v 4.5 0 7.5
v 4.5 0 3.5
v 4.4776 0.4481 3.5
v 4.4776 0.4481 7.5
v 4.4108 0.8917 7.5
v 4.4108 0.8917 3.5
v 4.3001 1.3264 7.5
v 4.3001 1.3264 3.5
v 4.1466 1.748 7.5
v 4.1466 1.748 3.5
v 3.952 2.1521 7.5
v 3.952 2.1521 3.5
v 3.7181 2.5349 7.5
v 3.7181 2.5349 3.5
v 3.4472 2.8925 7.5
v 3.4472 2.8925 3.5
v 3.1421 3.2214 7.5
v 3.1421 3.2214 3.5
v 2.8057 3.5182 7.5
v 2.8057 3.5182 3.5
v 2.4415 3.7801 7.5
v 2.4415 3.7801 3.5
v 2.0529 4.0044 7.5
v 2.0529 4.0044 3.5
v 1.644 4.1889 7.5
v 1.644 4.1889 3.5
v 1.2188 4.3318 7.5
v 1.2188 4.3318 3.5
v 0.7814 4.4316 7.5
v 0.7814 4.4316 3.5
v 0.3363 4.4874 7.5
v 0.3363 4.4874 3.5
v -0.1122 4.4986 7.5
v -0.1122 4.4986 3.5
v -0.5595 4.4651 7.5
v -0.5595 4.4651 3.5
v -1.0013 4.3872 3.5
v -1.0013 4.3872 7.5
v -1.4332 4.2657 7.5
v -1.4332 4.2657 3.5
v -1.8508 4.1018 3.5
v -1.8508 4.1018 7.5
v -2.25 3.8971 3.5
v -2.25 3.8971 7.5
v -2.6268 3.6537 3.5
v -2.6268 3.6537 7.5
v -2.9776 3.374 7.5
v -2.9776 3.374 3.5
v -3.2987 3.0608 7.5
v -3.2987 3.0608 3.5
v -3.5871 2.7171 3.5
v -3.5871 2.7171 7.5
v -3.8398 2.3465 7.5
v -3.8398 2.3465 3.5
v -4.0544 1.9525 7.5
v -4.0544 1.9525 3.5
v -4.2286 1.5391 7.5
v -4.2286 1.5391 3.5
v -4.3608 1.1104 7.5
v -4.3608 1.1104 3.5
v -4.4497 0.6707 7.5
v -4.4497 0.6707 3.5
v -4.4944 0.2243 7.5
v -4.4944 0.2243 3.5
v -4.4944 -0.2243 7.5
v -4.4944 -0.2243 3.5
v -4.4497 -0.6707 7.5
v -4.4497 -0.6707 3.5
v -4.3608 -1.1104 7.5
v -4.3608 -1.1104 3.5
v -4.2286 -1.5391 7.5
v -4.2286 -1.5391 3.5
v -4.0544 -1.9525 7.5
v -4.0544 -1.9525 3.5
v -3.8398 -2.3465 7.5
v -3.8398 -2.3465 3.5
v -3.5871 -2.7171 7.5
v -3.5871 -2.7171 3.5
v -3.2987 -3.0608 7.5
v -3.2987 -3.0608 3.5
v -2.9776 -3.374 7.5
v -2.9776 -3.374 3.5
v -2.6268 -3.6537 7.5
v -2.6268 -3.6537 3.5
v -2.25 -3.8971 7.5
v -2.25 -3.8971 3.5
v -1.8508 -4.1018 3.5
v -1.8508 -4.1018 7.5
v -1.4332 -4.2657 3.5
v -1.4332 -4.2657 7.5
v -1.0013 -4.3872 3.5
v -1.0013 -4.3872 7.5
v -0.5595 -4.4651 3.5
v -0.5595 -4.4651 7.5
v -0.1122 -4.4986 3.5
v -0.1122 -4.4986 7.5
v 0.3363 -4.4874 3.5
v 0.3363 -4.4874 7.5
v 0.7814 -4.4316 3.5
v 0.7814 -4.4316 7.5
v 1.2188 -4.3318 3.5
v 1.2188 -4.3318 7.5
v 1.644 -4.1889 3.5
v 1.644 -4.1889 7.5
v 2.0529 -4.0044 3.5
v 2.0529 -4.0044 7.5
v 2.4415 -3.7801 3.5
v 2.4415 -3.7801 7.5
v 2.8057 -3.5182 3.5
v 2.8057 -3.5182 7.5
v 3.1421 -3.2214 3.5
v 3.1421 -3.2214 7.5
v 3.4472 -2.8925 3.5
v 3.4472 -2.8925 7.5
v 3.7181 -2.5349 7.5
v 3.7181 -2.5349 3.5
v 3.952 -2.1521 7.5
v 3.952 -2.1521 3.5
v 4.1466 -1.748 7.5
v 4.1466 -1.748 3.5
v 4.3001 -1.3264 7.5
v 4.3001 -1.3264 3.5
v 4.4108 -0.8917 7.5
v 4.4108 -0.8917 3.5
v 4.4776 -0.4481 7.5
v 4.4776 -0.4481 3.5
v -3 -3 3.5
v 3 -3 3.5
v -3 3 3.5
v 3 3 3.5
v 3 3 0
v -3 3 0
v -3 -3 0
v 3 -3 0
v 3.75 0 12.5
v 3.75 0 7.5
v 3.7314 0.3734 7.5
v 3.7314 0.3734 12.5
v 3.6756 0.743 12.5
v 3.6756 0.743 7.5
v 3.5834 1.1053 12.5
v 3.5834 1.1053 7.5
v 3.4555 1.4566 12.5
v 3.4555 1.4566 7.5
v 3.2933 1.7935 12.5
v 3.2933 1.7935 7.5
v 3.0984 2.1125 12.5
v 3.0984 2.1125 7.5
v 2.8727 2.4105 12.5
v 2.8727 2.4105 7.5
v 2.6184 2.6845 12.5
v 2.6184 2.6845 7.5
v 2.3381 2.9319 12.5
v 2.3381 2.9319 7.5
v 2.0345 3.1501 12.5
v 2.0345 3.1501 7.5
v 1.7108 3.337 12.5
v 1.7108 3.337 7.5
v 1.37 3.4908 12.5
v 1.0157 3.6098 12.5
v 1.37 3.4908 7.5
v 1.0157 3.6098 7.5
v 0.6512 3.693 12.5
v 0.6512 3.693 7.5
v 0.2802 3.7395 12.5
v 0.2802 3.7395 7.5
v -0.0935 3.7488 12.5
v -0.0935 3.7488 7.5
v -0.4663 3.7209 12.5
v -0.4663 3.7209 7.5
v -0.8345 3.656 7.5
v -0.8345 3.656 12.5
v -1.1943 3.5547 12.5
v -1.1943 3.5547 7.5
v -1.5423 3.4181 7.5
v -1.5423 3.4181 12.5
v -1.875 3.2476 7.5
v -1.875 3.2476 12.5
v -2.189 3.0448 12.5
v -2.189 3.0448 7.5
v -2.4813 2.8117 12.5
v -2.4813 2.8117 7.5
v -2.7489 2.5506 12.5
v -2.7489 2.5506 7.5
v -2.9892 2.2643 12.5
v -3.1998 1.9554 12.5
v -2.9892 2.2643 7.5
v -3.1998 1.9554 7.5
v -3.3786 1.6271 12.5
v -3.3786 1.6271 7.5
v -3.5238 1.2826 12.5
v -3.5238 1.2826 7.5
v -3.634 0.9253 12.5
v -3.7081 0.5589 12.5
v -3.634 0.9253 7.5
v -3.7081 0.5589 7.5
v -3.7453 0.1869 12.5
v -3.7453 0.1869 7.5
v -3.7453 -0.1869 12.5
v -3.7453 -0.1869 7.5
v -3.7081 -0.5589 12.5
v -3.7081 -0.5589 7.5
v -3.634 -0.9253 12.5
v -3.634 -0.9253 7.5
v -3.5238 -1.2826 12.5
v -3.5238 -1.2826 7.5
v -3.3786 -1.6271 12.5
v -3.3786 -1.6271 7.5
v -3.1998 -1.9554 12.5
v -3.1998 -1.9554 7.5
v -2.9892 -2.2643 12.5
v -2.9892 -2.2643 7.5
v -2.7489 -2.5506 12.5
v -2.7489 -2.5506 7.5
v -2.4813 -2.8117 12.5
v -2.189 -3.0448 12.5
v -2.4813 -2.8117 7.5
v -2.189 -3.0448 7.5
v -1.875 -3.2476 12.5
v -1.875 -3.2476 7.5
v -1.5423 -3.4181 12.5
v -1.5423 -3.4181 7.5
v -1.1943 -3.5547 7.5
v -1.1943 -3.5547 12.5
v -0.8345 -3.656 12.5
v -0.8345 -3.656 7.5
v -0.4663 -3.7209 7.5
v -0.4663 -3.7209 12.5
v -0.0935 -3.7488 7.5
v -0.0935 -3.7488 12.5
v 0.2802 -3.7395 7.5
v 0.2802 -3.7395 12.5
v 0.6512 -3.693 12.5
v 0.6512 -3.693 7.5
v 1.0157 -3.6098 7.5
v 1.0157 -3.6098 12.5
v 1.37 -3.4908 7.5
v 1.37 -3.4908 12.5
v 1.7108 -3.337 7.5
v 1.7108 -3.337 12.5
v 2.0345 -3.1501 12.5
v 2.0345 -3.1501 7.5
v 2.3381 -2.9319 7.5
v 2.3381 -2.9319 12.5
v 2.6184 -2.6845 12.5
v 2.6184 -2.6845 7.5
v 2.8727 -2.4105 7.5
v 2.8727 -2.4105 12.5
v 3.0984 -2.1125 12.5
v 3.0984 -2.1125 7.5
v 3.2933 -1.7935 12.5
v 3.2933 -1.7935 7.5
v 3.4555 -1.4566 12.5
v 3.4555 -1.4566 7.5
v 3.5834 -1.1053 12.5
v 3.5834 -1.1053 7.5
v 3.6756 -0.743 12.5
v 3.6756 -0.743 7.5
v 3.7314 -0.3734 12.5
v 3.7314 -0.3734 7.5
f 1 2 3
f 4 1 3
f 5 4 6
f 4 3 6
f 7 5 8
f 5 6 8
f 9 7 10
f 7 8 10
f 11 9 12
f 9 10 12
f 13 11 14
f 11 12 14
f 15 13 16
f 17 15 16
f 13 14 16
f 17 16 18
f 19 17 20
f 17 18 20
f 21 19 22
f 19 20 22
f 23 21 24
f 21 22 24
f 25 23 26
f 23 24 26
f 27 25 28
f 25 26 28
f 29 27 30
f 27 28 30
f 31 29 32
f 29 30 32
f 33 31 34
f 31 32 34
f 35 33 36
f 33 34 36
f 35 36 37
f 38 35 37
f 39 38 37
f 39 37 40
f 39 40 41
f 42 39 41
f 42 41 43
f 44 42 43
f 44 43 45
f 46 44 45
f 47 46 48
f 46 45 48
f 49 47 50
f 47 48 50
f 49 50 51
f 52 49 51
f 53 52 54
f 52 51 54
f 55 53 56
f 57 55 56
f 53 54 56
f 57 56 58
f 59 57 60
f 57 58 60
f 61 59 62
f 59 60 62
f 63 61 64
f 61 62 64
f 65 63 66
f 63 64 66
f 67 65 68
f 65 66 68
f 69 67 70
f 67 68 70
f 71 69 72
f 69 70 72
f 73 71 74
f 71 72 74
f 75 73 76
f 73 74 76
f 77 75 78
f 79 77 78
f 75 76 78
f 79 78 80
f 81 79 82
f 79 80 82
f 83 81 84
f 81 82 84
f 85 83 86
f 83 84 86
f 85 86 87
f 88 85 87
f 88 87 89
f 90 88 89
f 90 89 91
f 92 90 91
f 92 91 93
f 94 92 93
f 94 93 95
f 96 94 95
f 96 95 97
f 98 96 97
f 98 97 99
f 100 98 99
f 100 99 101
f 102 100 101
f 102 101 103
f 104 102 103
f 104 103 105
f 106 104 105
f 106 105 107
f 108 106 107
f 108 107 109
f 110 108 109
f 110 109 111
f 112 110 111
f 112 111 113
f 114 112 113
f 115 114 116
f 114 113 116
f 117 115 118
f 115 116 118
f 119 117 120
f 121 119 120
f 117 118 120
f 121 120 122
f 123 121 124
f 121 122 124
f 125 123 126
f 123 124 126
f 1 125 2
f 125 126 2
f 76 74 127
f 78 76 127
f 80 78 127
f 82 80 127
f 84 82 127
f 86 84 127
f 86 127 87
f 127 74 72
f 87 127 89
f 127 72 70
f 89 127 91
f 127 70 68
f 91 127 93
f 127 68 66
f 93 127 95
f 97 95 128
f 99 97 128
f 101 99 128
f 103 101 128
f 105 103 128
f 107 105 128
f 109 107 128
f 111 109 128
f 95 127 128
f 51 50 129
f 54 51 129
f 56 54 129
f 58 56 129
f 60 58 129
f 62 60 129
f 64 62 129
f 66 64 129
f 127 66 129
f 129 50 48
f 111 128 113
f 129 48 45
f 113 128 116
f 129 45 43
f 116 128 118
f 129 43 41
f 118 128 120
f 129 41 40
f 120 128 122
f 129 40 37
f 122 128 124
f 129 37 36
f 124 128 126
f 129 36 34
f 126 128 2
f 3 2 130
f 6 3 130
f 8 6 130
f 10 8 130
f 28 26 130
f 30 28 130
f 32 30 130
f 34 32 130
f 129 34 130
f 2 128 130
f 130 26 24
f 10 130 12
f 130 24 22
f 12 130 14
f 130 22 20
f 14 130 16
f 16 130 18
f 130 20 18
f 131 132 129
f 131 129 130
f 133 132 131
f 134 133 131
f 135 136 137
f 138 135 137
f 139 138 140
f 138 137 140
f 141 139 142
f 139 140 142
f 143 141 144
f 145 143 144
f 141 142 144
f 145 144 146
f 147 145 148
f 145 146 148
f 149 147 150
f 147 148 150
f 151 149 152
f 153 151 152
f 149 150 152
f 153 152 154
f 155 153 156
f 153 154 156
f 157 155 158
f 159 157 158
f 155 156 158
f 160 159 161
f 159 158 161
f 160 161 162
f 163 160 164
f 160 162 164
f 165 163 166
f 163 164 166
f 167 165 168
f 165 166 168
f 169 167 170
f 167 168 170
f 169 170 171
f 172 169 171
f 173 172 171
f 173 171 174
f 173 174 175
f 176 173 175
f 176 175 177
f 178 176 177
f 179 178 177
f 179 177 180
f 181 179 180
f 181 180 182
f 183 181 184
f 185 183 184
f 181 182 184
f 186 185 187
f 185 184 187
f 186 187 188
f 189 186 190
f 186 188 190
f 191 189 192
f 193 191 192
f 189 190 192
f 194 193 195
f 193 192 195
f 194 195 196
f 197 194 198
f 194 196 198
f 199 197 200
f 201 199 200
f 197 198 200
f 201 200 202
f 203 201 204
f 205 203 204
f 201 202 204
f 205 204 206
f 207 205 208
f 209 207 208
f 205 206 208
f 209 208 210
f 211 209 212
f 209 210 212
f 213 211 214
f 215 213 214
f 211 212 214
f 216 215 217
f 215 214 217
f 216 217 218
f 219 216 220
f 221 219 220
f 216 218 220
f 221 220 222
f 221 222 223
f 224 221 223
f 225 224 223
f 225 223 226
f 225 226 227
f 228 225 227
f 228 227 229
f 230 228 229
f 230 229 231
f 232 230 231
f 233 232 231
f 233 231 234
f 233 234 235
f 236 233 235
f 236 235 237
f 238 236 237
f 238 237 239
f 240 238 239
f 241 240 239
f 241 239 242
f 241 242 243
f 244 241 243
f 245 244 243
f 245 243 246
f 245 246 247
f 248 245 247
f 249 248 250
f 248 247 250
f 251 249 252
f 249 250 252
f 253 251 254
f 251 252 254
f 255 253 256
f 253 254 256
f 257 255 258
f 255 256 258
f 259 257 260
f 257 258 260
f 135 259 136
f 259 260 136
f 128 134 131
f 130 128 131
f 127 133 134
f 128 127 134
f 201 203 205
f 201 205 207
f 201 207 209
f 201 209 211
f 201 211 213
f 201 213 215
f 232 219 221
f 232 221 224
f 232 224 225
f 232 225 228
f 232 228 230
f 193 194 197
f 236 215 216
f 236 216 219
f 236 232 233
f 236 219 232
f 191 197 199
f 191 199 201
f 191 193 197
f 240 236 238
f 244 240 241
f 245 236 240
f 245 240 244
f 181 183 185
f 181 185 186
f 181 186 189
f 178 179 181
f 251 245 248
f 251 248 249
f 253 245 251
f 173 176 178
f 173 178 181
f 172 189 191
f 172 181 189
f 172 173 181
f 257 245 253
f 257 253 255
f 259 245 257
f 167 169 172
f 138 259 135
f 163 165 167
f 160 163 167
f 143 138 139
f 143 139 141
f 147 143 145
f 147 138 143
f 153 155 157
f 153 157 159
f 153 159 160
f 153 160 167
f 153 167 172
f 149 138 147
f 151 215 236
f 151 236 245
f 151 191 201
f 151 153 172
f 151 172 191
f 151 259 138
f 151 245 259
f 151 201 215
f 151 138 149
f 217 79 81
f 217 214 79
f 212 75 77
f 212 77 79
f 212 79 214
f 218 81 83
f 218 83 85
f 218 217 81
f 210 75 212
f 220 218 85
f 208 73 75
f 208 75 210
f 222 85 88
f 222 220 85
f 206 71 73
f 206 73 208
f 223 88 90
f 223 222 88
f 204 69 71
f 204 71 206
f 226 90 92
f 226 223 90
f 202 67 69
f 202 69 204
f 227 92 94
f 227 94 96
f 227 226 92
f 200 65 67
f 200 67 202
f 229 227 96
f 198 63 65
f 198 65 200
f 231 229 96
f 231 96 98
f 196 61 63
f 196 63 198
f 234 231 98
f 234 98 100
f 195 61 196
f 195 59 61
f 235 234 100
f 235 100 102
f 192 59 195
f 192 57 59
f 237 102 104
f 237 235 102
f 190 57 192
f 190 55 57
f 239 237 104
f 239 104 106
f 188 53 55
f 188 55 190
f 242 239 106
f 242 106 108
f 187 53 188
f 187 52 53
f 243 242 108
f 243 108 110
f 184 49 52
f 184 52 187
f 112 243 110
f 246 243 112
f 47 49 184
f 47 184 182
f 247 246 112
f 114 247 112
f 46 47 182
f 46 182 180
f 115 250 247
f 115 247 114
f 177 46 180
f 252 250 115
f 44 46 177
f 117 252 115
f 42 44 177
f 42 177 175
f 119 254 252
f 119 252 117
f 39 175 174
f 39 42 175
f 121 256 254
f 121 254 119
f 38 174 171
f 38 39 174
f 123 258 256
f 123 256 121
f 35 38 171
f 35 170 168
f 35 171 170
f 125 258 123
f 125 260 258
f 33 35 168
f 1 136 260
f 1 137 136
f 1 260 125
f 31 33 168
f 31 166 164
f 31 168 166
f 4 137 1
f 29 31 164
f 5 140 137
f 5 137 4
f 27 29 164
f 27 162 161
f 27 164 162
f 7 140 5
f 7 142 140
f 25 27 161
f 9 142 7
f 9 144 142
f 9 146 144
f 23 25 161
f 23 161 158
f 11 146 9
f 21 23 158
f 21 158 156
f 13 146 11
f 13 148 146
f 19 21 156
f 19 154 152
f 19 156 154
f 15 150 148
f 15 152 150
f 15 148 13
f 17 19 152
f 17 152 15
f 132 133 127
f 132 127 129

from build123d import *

# Parameters (mm, degrees)
CROQUIS1_W              = 6
CROQUIS1_H              = 6
SALIENTE_EXTRUIR1_DEPTH = 3.5
CROQUIS2_R              = 4.5
SALIENTE_EXTRUIR2_DEPTH = 4
CROQUIS3_R              = 3.75
SALIENTE_EXTRUIR3_DEPTH = 5


with BuildPart() as part:
    # Croquis1 → Saliente-Extruir1 (new body)
    with BuildSketch(Plane.XY):
        Rectangle(CROQUIS1_W, CROQUIS1_H)
    extrude(amount=SALIENTE_EXTRUIR1_DEPTH)

    # Croquis2 → Saliente-Extruir2 (add)
    with BuildSketch(Plane.XY.offset(3.5)):
        Circle(CROQUIS2_R)
    extrude(amount=SALIENTE_EXTRUIR2_DEPTH)

    # Croquis3 → Saliente-Extruir3 (add)
    with BuildSketch(Plane.XY.offset(7.5)):
        Circle(CROQUIS3_R)
    extrude(amount=SALIENTE_EXTRUIR3_DEPTH)


solid = part.part
